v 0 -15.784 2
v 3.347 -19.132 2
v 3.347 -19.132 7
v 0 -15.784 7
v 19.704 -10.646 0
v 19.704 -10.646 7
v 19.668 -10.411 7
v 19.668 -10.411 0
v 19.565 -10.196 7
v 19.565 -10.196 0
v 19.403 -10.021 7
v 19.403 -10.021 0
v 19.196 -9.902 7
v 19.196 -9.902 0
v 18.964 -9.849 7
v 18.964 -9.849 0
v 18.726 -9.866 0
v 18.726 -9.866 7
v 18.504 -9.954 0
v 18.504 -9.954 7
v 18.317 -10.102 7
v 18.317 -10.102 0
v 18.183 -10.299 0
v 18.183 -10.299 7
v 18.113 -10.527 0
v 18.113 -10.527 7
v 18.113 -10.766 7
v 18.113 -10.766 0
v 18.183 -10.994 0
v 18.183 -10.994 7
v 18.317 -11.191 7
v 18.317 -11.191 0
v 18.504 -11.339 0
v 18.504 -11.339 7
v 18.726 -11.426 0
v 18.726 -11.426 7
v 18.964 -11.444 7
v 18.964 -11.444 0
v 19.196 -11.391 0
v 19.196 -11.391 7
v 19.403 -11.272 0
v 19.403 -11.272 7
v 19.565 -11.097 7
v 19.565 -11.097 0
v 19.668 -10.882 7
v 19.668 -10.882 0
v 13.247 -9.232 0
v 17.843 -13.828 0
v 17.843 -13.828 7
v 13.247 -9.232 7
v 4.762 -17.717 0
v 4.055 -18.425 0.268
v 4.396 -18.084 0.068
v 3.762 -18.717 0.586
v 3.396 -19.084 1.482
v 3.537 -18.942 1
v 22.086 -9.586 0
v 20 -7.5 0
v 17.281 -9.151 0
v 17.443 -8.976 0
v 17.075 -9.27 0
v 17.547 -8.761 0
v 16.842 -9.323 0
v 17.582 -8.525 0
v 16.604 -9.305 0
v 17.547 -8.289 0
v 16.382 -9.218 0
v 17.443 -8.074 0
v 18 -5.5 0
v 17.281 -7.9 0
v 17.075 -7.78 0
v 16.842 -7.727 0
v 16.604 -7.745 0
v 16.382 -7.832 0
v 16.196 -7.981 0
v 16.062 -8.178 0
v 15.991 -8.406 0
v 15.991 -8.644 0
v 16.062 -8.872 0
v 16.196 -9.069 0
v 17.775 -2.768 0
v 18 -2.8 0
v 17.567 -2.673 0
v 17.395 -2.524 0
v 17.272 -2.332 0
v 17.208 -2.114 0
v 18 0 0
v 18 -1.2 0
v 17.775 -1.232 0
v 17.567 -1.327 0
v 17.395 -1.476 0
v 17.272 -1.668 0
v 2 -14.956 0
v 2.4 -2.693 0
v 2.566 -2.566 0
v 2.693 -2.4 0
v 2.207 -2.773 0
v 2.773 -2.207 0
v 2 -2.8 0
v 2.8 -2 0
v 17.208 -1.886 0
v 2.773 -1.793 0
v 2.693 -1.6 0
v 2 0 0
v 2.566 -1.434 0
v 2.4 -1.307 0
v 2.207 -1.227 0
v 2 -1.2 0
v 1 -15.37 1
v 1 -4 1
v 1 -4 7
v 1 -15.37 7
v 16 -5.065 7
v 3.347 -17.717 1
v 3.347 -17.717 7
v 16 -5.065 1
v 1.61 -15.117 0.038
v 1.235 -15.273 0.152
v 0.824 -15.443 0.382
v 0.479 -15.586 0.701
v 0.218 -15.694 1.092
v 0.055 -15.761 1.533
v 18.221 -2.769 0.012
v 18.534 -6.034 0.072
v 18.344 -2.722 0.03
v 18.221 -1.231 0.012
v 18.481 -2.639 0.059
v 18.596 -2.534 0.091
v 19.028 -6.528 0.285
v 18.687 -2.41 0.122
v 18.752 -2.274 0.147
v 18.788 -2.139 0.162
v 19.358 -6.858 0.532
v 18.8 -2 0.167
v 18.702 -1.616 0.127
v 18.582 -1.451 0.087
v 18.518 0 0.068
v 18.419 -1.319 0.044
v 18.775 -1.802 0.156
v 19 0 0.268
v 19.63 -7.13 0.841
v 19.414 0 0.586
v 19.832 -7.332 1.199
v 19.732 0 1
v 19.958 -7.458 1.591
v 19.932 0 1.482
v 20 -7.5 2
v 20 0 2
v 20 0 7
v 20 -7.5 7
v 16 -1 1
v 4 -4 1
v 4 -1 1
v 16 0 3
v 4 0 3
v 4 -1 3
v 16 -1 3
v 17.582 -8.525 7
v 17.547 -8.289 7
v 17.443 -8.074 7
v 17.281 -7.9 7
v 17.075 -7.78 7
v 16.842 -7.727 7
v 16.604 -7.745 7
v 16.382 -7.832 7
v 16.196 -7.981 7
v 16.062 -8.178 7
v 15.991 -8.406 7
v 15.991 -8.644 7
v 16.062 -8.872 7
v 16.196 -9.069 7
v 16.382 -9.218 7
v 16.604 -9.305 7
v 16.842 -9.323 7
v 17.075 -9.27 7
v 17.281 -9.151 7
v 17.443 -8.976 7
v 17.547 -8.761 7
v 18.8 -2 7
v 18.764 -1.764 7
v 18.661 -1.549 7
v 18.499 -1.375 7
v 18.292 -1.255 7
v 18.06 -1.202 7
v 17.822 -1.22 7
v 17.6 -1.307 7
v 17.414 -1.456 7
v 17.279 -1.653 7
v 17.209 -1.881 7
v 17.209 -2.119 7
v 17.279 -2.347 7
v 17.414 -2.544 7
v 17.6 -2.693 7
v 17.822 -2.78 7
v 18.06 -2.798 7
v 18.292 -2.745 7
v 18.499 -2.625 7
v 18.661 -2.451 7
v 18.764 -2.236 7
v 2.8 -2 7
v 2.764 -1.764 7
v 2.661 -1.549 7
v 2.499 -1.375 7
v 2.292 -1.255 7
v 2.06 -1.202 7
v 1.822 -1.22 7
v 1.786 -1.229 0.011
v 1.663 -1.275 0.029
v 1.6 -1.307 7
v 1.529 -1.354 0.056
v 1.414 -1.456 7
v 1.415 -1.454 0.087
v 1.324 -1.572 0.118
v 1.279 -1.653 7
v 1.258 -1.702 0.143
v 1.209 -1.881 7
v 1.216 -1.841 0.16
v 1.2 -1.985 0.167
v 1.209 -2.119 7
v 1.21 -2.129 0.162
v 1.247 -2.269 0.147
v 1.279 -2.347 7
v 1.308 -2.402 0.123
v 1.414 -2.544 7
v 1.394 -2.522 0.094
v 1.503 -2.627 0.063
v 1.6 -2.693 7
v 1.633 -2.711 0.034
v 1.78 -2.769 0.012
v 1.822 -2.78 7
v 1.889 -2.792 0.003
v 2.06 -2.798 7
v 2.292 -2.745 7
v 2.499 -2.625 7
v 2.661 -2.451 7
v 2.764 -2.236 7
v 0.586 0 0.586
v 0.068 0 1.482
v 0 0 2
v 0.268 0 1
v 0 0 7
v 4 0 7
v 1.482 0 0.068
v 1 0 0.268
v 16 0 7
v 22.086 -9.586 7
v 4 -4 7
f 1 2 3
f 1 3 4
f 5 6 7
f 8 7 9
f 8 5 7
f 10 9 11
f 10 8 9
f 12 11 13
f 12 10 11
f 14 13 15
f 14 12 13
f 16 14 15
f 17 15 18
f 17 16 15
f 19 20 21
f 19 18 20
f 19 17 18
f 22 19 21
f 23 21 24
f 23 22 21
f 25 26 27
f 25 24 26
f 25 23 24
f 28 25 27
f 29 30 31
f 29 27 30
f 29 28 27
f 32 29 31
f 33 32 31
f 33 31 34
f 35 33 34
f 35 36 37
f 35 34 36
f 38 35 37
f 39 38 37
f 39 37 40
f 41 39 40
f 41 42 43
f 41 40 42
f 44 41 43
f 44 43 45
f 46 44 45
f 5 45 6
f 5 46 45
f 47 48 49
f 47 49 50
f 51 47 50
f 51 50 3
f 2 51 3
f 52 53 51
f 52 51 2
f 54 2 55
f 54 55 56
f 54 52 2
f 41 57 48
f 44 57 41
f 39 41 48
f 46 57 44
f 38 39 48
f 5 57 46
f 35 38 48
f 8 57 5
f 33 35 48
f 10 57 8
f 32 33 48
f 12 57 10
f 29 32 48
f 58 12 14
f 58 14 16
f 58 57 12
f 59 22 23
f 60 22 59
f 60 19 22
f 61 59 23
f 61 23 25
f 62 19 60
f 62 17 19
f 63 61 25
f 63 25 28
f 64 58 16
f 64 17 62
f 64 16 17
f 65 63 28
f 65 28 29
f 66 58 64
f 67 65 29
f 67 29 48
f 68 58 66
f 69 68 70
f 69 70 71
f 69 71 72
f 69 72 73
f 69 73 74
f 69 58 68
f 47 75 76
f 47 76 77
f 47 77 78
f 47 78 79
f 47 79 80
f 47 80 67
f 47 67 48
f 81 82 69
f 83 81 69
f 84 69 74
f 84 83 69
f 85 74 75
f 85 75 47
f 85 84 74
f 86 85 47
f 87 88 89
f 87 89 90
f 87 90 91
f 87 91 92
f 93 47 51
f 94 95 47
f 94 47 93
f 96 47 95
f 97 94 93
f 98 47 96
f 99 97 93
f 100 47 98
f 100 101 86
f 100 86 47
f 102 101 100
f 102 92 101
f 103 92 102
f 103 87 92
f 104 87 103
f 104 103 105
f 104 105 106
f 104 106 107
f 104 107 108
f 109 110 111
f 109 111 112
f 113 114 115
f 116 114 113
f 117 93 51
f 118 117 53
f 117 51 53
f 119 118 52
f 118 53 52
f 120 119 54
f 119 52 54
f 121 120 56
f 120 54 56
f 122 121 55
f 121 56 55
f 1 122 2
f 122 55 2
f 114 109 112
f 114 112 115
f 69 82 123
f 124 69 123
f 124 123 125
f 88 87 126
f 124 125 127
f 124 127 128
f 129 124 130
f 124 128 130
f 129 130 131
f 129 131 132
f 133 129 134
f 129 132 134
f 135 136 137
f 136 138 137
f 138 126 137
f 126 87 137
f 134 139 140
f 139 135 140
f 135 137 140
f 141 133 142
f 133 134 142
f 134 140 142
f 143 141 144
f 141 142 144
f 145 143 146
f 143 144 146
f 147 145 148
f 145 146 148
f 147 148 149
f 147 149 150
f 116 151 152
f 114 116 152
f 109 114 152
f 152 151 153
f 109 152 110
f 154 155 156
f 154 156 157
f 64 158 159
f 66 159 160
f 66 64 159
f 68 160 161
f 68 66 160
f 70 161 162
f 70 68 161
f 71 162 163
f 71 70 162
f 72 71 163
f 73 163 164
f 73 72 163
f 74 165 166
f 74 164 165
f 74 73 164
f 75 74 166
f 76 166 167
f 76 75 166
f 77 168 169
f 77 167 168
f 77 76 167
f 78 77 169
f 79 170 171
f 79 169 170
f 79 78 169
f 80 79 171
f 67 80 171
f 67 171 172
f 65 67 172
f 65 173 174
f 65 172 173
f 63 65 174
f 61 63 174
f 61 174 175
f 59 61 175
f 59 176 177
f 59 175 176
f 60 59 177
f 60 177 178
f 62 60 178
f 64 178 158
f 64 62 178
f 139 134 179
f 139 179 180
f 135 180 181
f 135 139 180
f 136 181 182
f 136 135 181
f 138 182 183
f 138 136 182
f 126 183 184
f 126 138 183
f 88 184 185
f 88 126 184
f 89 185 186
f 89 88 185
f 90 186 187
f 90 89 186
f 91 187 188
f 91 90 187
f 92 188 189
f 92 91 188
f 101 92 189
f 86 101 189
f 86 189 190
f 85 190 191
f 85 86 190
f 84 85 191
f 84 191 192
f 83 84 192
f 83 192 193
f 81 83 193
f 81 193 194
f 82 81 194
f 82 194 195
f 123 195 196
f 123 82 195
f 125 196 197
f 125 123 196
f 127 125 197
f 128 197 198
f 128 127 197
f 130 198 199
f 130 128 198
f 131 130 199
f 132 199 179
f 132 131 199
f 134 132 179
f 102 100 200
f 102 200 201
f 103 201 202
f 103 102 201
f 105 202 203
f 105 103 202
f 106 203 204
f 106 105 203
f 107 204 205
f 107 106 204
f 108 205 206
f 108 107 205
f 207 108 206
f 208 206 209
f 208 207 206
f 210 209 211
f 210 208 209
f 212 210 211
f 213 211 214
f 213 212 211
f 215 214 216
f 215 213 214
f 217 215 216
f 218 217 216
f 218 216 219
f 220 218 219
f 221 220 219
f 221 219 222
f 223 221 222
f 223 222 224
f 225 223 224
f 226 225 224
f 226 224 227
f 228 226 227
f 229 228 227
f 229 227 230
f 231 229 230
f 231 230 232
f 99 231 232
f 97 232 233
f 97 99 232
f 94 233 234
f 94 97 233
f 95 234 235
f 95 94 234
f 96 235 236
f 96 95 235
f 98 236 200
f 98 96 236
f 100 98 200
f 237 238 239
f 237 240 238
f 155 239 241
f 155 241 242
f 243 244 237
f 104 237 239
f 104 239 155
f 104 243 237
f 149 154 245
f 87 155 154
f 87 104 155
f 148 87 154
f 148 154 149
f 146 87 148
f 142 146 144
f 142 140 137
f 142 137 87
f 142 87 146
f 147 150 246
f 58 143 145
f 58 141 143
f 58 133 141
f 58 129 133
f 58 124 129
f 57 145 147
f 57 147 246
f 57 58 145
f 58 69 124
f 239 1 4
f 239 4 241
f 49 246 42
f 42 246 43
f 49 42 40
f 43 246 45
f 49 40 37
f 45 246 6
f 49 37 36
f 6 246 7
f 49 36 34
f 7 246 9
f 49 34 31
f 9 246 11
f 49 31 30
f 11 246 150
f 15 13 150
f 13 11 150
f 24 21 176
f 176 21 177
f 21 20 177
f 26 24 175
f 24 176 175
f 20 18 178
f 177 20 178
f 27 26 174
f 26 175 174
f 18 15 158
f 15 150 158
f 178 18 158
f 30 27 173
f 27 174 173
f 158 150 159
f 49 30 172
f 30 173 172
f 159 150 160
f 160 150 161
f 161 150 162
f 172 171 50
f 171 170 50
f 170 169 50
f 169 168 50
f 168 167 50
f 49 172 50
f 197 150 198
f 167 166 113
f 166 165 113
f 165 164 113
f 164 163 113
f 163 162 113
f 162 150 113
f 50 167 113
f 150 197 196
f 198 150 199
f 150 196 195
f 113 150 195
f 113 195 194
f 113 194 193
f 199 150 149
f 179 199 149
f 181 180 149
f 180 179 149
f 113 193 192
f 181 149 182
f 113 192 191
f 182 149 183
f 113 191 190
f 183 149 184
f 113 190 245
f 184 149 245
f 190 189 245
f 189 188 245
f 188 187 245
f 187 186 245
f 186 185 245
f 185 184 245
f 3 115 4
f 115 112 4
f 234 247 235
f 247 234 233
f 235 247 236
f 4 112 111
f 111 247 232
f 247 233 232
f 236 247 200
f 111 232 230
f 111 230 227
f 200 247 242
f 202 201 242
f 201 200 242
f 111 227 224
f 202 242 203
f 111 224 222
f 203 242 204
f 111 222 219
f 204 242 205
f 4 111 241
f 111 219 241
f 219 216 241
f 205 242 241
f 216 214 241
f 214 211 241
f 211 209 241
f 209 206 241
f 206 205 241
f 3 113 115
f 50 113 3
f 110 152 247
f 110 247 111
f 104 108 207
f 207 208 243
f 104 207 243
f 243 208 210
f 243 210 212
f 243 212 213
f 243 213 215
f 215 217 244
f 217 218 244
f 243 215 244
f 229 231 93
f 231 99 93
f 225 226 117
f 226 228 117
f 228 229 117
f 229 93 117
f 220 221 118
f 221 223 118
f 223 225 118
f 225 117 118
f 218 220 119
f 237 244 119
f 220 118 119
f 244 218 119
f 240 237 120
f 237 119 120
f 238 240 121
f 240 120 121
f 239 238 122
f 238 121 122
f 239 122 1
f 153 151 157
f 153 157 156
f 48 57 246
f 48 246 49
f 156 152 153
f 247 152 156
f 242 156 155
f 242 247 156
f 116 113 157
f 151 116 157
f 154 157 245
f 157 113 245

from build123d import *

# Parameters (mm, degrees)
BOSS_EXTRUDE1_DEPTH = 7
BOSS_EXTRUDE2_DEPTH = 1
SKETCH5_R           = 0.799999999
SKETCH5_R_2         = 0.800000001
SCREW_HOLES_DEPTH   = 31.046659105
FILLET1_R           = 2
CUT_EXTRUDE2_START  = 7
SKETCH7_W           = 11.999999998
SKETCH7_H           = 4
CUT_EXTRUDE2_DEPTH  = 4


with BuildPart() as part:
    # Sketch1 → Boss-Extrude1 (new body)
    with BuildSketch(Plane.XY):
        Polygon((0, 0), (19.999999998, 0), (19.999999998, -7.5), (22.085746954, -9.585746956), (17.843106269, -13.828387641), (13.246912191, -9.232193563), (3.347417254, -19.1316885), (0, -15.784271246), align=None)
        Polygon((4, -1), (4, -4), (1, -4), (1, -15.370057685), (3.347417253, -17.717474938), (15.999999998, -5.064892192), (15.999999998, -1), align=None, mode=Mode.SUBTRACT)
    extrude(amount=BOSS_EXTRUDE1_DEPTH)

    # Sketch6 → Boss-Extrude2 (add)
    with BuildSketch(Plane.XY):
        Polygon((0, 0), (19.999999998, 0), (19.999999998, -7.5), (22.085746954, -9.585746956), (17.843106269, -13.828387641), (13.246912191, -9.232193563), (3.347417254, -19.1316885), (0, -15.784271246), align=None)
    extrude(amount=BOSS_EXTRUDE2_DEPTH)

    # Sketch5 → Screw Holes (cut, through all)
    with BuildSketch(Plane.XY):
        with Locations((18.90376644, -10.646407127)):
            Circle(SKETCH5_R)
        with Locations((16.782446096, -8.525086783)):
            Circle(SKETCH5_R)
        with Locations((1.999999999, -2)):
            Circle(SKETCH5_R_2)
        with Locations((17.999999999, -2)):
            Circle(SKETCH5_R_2)
    extrude(amount=SCREW_HOLES_DEPTH, mode=Mode.SUBTRACT)

    # Fillet1
    # the kernel refuses this fillet: 2 mm, written as the material it takes off along each edge
    with BuildSketch(Plane(origin=(19.999999998, 5, 0), x_dir=(-1, 0, 0), z_dir=(0, -1, 0))) as fillet1_piece_1_section:
        with BuildLine():
            CenterArc((FILLET1_R, -FILLET1_R), FILLET1_R, 90, 90)
            Line((0, -FILLET1_R), (0, 0))
            Line((0, 0), (FILLET1_R, 0))
        make_face()
    fillet1_piece_1 = extrude(amount=17.5, mode=Mode.PRIVATE)
    fillet1_piece_1 = split(fillet1_piece_1, bisect_by=Plane(origin=(16.546980954, -4.046980955, 0.4619066), z_dir=(0.7071067811865476, 0.7071067811865476, 0)), keep=Keep.TOP, mode=Mode.PRIVATE)
    add(fillet1_piece_1, mode=Mode.SUBTRACT)
    with BuildSketch(Plane(origin=(6.88295116, -22.667222406, 0), x_dir=(0.7071067811865475, 0.7071067811865477, 0), z_dir=(-0.7071067811865477, 0.7071067811865475, 0))) as fillet1_piece_2:
        with BuildLine():
            CenterArc((FILLET1_R, -FILLET1_R), FILLET1_R, 90, 90)
            Line((0, -FILLET1_R), (0, 0))
            Line((0, 0), (FILLET1_R, 0))
        make_face()
    extrude(amount=14.73396288, mode=Mode.SUBTRACT)
    with BuildSketch(Plane(origin=(0, -20.784271246, 0), x_dir=(1, 0, 0), z_dir=(0, 1, 0))) as fillet1_piece_3:
        with BuildLine():
            CenterArc((FILLET1_R, -FILLET1_R), FILLET1_R, 90, 90)
            Line((0, -FILLET1_R), (0, 0))
            Line((0, 0), (FILLET1_R, 0))
        make_face()
    extrude(amount=25.784271246, mode=Mode.SUBTRACT)

    # Sketch7 → Cut-Extrude2 (cut)
    with BuildSketch(Plane.XY.offset(CUT_EXTRUDE2_START)):
        with Locations((9.999999999, -2)):
            Rectangle(SKETCH7_W, SKETCH7_H)
    extrude(amount=-CUT_EXTRUDE2_DEPTH, mode=Mode.SUBTRACT)


solid = part.part
